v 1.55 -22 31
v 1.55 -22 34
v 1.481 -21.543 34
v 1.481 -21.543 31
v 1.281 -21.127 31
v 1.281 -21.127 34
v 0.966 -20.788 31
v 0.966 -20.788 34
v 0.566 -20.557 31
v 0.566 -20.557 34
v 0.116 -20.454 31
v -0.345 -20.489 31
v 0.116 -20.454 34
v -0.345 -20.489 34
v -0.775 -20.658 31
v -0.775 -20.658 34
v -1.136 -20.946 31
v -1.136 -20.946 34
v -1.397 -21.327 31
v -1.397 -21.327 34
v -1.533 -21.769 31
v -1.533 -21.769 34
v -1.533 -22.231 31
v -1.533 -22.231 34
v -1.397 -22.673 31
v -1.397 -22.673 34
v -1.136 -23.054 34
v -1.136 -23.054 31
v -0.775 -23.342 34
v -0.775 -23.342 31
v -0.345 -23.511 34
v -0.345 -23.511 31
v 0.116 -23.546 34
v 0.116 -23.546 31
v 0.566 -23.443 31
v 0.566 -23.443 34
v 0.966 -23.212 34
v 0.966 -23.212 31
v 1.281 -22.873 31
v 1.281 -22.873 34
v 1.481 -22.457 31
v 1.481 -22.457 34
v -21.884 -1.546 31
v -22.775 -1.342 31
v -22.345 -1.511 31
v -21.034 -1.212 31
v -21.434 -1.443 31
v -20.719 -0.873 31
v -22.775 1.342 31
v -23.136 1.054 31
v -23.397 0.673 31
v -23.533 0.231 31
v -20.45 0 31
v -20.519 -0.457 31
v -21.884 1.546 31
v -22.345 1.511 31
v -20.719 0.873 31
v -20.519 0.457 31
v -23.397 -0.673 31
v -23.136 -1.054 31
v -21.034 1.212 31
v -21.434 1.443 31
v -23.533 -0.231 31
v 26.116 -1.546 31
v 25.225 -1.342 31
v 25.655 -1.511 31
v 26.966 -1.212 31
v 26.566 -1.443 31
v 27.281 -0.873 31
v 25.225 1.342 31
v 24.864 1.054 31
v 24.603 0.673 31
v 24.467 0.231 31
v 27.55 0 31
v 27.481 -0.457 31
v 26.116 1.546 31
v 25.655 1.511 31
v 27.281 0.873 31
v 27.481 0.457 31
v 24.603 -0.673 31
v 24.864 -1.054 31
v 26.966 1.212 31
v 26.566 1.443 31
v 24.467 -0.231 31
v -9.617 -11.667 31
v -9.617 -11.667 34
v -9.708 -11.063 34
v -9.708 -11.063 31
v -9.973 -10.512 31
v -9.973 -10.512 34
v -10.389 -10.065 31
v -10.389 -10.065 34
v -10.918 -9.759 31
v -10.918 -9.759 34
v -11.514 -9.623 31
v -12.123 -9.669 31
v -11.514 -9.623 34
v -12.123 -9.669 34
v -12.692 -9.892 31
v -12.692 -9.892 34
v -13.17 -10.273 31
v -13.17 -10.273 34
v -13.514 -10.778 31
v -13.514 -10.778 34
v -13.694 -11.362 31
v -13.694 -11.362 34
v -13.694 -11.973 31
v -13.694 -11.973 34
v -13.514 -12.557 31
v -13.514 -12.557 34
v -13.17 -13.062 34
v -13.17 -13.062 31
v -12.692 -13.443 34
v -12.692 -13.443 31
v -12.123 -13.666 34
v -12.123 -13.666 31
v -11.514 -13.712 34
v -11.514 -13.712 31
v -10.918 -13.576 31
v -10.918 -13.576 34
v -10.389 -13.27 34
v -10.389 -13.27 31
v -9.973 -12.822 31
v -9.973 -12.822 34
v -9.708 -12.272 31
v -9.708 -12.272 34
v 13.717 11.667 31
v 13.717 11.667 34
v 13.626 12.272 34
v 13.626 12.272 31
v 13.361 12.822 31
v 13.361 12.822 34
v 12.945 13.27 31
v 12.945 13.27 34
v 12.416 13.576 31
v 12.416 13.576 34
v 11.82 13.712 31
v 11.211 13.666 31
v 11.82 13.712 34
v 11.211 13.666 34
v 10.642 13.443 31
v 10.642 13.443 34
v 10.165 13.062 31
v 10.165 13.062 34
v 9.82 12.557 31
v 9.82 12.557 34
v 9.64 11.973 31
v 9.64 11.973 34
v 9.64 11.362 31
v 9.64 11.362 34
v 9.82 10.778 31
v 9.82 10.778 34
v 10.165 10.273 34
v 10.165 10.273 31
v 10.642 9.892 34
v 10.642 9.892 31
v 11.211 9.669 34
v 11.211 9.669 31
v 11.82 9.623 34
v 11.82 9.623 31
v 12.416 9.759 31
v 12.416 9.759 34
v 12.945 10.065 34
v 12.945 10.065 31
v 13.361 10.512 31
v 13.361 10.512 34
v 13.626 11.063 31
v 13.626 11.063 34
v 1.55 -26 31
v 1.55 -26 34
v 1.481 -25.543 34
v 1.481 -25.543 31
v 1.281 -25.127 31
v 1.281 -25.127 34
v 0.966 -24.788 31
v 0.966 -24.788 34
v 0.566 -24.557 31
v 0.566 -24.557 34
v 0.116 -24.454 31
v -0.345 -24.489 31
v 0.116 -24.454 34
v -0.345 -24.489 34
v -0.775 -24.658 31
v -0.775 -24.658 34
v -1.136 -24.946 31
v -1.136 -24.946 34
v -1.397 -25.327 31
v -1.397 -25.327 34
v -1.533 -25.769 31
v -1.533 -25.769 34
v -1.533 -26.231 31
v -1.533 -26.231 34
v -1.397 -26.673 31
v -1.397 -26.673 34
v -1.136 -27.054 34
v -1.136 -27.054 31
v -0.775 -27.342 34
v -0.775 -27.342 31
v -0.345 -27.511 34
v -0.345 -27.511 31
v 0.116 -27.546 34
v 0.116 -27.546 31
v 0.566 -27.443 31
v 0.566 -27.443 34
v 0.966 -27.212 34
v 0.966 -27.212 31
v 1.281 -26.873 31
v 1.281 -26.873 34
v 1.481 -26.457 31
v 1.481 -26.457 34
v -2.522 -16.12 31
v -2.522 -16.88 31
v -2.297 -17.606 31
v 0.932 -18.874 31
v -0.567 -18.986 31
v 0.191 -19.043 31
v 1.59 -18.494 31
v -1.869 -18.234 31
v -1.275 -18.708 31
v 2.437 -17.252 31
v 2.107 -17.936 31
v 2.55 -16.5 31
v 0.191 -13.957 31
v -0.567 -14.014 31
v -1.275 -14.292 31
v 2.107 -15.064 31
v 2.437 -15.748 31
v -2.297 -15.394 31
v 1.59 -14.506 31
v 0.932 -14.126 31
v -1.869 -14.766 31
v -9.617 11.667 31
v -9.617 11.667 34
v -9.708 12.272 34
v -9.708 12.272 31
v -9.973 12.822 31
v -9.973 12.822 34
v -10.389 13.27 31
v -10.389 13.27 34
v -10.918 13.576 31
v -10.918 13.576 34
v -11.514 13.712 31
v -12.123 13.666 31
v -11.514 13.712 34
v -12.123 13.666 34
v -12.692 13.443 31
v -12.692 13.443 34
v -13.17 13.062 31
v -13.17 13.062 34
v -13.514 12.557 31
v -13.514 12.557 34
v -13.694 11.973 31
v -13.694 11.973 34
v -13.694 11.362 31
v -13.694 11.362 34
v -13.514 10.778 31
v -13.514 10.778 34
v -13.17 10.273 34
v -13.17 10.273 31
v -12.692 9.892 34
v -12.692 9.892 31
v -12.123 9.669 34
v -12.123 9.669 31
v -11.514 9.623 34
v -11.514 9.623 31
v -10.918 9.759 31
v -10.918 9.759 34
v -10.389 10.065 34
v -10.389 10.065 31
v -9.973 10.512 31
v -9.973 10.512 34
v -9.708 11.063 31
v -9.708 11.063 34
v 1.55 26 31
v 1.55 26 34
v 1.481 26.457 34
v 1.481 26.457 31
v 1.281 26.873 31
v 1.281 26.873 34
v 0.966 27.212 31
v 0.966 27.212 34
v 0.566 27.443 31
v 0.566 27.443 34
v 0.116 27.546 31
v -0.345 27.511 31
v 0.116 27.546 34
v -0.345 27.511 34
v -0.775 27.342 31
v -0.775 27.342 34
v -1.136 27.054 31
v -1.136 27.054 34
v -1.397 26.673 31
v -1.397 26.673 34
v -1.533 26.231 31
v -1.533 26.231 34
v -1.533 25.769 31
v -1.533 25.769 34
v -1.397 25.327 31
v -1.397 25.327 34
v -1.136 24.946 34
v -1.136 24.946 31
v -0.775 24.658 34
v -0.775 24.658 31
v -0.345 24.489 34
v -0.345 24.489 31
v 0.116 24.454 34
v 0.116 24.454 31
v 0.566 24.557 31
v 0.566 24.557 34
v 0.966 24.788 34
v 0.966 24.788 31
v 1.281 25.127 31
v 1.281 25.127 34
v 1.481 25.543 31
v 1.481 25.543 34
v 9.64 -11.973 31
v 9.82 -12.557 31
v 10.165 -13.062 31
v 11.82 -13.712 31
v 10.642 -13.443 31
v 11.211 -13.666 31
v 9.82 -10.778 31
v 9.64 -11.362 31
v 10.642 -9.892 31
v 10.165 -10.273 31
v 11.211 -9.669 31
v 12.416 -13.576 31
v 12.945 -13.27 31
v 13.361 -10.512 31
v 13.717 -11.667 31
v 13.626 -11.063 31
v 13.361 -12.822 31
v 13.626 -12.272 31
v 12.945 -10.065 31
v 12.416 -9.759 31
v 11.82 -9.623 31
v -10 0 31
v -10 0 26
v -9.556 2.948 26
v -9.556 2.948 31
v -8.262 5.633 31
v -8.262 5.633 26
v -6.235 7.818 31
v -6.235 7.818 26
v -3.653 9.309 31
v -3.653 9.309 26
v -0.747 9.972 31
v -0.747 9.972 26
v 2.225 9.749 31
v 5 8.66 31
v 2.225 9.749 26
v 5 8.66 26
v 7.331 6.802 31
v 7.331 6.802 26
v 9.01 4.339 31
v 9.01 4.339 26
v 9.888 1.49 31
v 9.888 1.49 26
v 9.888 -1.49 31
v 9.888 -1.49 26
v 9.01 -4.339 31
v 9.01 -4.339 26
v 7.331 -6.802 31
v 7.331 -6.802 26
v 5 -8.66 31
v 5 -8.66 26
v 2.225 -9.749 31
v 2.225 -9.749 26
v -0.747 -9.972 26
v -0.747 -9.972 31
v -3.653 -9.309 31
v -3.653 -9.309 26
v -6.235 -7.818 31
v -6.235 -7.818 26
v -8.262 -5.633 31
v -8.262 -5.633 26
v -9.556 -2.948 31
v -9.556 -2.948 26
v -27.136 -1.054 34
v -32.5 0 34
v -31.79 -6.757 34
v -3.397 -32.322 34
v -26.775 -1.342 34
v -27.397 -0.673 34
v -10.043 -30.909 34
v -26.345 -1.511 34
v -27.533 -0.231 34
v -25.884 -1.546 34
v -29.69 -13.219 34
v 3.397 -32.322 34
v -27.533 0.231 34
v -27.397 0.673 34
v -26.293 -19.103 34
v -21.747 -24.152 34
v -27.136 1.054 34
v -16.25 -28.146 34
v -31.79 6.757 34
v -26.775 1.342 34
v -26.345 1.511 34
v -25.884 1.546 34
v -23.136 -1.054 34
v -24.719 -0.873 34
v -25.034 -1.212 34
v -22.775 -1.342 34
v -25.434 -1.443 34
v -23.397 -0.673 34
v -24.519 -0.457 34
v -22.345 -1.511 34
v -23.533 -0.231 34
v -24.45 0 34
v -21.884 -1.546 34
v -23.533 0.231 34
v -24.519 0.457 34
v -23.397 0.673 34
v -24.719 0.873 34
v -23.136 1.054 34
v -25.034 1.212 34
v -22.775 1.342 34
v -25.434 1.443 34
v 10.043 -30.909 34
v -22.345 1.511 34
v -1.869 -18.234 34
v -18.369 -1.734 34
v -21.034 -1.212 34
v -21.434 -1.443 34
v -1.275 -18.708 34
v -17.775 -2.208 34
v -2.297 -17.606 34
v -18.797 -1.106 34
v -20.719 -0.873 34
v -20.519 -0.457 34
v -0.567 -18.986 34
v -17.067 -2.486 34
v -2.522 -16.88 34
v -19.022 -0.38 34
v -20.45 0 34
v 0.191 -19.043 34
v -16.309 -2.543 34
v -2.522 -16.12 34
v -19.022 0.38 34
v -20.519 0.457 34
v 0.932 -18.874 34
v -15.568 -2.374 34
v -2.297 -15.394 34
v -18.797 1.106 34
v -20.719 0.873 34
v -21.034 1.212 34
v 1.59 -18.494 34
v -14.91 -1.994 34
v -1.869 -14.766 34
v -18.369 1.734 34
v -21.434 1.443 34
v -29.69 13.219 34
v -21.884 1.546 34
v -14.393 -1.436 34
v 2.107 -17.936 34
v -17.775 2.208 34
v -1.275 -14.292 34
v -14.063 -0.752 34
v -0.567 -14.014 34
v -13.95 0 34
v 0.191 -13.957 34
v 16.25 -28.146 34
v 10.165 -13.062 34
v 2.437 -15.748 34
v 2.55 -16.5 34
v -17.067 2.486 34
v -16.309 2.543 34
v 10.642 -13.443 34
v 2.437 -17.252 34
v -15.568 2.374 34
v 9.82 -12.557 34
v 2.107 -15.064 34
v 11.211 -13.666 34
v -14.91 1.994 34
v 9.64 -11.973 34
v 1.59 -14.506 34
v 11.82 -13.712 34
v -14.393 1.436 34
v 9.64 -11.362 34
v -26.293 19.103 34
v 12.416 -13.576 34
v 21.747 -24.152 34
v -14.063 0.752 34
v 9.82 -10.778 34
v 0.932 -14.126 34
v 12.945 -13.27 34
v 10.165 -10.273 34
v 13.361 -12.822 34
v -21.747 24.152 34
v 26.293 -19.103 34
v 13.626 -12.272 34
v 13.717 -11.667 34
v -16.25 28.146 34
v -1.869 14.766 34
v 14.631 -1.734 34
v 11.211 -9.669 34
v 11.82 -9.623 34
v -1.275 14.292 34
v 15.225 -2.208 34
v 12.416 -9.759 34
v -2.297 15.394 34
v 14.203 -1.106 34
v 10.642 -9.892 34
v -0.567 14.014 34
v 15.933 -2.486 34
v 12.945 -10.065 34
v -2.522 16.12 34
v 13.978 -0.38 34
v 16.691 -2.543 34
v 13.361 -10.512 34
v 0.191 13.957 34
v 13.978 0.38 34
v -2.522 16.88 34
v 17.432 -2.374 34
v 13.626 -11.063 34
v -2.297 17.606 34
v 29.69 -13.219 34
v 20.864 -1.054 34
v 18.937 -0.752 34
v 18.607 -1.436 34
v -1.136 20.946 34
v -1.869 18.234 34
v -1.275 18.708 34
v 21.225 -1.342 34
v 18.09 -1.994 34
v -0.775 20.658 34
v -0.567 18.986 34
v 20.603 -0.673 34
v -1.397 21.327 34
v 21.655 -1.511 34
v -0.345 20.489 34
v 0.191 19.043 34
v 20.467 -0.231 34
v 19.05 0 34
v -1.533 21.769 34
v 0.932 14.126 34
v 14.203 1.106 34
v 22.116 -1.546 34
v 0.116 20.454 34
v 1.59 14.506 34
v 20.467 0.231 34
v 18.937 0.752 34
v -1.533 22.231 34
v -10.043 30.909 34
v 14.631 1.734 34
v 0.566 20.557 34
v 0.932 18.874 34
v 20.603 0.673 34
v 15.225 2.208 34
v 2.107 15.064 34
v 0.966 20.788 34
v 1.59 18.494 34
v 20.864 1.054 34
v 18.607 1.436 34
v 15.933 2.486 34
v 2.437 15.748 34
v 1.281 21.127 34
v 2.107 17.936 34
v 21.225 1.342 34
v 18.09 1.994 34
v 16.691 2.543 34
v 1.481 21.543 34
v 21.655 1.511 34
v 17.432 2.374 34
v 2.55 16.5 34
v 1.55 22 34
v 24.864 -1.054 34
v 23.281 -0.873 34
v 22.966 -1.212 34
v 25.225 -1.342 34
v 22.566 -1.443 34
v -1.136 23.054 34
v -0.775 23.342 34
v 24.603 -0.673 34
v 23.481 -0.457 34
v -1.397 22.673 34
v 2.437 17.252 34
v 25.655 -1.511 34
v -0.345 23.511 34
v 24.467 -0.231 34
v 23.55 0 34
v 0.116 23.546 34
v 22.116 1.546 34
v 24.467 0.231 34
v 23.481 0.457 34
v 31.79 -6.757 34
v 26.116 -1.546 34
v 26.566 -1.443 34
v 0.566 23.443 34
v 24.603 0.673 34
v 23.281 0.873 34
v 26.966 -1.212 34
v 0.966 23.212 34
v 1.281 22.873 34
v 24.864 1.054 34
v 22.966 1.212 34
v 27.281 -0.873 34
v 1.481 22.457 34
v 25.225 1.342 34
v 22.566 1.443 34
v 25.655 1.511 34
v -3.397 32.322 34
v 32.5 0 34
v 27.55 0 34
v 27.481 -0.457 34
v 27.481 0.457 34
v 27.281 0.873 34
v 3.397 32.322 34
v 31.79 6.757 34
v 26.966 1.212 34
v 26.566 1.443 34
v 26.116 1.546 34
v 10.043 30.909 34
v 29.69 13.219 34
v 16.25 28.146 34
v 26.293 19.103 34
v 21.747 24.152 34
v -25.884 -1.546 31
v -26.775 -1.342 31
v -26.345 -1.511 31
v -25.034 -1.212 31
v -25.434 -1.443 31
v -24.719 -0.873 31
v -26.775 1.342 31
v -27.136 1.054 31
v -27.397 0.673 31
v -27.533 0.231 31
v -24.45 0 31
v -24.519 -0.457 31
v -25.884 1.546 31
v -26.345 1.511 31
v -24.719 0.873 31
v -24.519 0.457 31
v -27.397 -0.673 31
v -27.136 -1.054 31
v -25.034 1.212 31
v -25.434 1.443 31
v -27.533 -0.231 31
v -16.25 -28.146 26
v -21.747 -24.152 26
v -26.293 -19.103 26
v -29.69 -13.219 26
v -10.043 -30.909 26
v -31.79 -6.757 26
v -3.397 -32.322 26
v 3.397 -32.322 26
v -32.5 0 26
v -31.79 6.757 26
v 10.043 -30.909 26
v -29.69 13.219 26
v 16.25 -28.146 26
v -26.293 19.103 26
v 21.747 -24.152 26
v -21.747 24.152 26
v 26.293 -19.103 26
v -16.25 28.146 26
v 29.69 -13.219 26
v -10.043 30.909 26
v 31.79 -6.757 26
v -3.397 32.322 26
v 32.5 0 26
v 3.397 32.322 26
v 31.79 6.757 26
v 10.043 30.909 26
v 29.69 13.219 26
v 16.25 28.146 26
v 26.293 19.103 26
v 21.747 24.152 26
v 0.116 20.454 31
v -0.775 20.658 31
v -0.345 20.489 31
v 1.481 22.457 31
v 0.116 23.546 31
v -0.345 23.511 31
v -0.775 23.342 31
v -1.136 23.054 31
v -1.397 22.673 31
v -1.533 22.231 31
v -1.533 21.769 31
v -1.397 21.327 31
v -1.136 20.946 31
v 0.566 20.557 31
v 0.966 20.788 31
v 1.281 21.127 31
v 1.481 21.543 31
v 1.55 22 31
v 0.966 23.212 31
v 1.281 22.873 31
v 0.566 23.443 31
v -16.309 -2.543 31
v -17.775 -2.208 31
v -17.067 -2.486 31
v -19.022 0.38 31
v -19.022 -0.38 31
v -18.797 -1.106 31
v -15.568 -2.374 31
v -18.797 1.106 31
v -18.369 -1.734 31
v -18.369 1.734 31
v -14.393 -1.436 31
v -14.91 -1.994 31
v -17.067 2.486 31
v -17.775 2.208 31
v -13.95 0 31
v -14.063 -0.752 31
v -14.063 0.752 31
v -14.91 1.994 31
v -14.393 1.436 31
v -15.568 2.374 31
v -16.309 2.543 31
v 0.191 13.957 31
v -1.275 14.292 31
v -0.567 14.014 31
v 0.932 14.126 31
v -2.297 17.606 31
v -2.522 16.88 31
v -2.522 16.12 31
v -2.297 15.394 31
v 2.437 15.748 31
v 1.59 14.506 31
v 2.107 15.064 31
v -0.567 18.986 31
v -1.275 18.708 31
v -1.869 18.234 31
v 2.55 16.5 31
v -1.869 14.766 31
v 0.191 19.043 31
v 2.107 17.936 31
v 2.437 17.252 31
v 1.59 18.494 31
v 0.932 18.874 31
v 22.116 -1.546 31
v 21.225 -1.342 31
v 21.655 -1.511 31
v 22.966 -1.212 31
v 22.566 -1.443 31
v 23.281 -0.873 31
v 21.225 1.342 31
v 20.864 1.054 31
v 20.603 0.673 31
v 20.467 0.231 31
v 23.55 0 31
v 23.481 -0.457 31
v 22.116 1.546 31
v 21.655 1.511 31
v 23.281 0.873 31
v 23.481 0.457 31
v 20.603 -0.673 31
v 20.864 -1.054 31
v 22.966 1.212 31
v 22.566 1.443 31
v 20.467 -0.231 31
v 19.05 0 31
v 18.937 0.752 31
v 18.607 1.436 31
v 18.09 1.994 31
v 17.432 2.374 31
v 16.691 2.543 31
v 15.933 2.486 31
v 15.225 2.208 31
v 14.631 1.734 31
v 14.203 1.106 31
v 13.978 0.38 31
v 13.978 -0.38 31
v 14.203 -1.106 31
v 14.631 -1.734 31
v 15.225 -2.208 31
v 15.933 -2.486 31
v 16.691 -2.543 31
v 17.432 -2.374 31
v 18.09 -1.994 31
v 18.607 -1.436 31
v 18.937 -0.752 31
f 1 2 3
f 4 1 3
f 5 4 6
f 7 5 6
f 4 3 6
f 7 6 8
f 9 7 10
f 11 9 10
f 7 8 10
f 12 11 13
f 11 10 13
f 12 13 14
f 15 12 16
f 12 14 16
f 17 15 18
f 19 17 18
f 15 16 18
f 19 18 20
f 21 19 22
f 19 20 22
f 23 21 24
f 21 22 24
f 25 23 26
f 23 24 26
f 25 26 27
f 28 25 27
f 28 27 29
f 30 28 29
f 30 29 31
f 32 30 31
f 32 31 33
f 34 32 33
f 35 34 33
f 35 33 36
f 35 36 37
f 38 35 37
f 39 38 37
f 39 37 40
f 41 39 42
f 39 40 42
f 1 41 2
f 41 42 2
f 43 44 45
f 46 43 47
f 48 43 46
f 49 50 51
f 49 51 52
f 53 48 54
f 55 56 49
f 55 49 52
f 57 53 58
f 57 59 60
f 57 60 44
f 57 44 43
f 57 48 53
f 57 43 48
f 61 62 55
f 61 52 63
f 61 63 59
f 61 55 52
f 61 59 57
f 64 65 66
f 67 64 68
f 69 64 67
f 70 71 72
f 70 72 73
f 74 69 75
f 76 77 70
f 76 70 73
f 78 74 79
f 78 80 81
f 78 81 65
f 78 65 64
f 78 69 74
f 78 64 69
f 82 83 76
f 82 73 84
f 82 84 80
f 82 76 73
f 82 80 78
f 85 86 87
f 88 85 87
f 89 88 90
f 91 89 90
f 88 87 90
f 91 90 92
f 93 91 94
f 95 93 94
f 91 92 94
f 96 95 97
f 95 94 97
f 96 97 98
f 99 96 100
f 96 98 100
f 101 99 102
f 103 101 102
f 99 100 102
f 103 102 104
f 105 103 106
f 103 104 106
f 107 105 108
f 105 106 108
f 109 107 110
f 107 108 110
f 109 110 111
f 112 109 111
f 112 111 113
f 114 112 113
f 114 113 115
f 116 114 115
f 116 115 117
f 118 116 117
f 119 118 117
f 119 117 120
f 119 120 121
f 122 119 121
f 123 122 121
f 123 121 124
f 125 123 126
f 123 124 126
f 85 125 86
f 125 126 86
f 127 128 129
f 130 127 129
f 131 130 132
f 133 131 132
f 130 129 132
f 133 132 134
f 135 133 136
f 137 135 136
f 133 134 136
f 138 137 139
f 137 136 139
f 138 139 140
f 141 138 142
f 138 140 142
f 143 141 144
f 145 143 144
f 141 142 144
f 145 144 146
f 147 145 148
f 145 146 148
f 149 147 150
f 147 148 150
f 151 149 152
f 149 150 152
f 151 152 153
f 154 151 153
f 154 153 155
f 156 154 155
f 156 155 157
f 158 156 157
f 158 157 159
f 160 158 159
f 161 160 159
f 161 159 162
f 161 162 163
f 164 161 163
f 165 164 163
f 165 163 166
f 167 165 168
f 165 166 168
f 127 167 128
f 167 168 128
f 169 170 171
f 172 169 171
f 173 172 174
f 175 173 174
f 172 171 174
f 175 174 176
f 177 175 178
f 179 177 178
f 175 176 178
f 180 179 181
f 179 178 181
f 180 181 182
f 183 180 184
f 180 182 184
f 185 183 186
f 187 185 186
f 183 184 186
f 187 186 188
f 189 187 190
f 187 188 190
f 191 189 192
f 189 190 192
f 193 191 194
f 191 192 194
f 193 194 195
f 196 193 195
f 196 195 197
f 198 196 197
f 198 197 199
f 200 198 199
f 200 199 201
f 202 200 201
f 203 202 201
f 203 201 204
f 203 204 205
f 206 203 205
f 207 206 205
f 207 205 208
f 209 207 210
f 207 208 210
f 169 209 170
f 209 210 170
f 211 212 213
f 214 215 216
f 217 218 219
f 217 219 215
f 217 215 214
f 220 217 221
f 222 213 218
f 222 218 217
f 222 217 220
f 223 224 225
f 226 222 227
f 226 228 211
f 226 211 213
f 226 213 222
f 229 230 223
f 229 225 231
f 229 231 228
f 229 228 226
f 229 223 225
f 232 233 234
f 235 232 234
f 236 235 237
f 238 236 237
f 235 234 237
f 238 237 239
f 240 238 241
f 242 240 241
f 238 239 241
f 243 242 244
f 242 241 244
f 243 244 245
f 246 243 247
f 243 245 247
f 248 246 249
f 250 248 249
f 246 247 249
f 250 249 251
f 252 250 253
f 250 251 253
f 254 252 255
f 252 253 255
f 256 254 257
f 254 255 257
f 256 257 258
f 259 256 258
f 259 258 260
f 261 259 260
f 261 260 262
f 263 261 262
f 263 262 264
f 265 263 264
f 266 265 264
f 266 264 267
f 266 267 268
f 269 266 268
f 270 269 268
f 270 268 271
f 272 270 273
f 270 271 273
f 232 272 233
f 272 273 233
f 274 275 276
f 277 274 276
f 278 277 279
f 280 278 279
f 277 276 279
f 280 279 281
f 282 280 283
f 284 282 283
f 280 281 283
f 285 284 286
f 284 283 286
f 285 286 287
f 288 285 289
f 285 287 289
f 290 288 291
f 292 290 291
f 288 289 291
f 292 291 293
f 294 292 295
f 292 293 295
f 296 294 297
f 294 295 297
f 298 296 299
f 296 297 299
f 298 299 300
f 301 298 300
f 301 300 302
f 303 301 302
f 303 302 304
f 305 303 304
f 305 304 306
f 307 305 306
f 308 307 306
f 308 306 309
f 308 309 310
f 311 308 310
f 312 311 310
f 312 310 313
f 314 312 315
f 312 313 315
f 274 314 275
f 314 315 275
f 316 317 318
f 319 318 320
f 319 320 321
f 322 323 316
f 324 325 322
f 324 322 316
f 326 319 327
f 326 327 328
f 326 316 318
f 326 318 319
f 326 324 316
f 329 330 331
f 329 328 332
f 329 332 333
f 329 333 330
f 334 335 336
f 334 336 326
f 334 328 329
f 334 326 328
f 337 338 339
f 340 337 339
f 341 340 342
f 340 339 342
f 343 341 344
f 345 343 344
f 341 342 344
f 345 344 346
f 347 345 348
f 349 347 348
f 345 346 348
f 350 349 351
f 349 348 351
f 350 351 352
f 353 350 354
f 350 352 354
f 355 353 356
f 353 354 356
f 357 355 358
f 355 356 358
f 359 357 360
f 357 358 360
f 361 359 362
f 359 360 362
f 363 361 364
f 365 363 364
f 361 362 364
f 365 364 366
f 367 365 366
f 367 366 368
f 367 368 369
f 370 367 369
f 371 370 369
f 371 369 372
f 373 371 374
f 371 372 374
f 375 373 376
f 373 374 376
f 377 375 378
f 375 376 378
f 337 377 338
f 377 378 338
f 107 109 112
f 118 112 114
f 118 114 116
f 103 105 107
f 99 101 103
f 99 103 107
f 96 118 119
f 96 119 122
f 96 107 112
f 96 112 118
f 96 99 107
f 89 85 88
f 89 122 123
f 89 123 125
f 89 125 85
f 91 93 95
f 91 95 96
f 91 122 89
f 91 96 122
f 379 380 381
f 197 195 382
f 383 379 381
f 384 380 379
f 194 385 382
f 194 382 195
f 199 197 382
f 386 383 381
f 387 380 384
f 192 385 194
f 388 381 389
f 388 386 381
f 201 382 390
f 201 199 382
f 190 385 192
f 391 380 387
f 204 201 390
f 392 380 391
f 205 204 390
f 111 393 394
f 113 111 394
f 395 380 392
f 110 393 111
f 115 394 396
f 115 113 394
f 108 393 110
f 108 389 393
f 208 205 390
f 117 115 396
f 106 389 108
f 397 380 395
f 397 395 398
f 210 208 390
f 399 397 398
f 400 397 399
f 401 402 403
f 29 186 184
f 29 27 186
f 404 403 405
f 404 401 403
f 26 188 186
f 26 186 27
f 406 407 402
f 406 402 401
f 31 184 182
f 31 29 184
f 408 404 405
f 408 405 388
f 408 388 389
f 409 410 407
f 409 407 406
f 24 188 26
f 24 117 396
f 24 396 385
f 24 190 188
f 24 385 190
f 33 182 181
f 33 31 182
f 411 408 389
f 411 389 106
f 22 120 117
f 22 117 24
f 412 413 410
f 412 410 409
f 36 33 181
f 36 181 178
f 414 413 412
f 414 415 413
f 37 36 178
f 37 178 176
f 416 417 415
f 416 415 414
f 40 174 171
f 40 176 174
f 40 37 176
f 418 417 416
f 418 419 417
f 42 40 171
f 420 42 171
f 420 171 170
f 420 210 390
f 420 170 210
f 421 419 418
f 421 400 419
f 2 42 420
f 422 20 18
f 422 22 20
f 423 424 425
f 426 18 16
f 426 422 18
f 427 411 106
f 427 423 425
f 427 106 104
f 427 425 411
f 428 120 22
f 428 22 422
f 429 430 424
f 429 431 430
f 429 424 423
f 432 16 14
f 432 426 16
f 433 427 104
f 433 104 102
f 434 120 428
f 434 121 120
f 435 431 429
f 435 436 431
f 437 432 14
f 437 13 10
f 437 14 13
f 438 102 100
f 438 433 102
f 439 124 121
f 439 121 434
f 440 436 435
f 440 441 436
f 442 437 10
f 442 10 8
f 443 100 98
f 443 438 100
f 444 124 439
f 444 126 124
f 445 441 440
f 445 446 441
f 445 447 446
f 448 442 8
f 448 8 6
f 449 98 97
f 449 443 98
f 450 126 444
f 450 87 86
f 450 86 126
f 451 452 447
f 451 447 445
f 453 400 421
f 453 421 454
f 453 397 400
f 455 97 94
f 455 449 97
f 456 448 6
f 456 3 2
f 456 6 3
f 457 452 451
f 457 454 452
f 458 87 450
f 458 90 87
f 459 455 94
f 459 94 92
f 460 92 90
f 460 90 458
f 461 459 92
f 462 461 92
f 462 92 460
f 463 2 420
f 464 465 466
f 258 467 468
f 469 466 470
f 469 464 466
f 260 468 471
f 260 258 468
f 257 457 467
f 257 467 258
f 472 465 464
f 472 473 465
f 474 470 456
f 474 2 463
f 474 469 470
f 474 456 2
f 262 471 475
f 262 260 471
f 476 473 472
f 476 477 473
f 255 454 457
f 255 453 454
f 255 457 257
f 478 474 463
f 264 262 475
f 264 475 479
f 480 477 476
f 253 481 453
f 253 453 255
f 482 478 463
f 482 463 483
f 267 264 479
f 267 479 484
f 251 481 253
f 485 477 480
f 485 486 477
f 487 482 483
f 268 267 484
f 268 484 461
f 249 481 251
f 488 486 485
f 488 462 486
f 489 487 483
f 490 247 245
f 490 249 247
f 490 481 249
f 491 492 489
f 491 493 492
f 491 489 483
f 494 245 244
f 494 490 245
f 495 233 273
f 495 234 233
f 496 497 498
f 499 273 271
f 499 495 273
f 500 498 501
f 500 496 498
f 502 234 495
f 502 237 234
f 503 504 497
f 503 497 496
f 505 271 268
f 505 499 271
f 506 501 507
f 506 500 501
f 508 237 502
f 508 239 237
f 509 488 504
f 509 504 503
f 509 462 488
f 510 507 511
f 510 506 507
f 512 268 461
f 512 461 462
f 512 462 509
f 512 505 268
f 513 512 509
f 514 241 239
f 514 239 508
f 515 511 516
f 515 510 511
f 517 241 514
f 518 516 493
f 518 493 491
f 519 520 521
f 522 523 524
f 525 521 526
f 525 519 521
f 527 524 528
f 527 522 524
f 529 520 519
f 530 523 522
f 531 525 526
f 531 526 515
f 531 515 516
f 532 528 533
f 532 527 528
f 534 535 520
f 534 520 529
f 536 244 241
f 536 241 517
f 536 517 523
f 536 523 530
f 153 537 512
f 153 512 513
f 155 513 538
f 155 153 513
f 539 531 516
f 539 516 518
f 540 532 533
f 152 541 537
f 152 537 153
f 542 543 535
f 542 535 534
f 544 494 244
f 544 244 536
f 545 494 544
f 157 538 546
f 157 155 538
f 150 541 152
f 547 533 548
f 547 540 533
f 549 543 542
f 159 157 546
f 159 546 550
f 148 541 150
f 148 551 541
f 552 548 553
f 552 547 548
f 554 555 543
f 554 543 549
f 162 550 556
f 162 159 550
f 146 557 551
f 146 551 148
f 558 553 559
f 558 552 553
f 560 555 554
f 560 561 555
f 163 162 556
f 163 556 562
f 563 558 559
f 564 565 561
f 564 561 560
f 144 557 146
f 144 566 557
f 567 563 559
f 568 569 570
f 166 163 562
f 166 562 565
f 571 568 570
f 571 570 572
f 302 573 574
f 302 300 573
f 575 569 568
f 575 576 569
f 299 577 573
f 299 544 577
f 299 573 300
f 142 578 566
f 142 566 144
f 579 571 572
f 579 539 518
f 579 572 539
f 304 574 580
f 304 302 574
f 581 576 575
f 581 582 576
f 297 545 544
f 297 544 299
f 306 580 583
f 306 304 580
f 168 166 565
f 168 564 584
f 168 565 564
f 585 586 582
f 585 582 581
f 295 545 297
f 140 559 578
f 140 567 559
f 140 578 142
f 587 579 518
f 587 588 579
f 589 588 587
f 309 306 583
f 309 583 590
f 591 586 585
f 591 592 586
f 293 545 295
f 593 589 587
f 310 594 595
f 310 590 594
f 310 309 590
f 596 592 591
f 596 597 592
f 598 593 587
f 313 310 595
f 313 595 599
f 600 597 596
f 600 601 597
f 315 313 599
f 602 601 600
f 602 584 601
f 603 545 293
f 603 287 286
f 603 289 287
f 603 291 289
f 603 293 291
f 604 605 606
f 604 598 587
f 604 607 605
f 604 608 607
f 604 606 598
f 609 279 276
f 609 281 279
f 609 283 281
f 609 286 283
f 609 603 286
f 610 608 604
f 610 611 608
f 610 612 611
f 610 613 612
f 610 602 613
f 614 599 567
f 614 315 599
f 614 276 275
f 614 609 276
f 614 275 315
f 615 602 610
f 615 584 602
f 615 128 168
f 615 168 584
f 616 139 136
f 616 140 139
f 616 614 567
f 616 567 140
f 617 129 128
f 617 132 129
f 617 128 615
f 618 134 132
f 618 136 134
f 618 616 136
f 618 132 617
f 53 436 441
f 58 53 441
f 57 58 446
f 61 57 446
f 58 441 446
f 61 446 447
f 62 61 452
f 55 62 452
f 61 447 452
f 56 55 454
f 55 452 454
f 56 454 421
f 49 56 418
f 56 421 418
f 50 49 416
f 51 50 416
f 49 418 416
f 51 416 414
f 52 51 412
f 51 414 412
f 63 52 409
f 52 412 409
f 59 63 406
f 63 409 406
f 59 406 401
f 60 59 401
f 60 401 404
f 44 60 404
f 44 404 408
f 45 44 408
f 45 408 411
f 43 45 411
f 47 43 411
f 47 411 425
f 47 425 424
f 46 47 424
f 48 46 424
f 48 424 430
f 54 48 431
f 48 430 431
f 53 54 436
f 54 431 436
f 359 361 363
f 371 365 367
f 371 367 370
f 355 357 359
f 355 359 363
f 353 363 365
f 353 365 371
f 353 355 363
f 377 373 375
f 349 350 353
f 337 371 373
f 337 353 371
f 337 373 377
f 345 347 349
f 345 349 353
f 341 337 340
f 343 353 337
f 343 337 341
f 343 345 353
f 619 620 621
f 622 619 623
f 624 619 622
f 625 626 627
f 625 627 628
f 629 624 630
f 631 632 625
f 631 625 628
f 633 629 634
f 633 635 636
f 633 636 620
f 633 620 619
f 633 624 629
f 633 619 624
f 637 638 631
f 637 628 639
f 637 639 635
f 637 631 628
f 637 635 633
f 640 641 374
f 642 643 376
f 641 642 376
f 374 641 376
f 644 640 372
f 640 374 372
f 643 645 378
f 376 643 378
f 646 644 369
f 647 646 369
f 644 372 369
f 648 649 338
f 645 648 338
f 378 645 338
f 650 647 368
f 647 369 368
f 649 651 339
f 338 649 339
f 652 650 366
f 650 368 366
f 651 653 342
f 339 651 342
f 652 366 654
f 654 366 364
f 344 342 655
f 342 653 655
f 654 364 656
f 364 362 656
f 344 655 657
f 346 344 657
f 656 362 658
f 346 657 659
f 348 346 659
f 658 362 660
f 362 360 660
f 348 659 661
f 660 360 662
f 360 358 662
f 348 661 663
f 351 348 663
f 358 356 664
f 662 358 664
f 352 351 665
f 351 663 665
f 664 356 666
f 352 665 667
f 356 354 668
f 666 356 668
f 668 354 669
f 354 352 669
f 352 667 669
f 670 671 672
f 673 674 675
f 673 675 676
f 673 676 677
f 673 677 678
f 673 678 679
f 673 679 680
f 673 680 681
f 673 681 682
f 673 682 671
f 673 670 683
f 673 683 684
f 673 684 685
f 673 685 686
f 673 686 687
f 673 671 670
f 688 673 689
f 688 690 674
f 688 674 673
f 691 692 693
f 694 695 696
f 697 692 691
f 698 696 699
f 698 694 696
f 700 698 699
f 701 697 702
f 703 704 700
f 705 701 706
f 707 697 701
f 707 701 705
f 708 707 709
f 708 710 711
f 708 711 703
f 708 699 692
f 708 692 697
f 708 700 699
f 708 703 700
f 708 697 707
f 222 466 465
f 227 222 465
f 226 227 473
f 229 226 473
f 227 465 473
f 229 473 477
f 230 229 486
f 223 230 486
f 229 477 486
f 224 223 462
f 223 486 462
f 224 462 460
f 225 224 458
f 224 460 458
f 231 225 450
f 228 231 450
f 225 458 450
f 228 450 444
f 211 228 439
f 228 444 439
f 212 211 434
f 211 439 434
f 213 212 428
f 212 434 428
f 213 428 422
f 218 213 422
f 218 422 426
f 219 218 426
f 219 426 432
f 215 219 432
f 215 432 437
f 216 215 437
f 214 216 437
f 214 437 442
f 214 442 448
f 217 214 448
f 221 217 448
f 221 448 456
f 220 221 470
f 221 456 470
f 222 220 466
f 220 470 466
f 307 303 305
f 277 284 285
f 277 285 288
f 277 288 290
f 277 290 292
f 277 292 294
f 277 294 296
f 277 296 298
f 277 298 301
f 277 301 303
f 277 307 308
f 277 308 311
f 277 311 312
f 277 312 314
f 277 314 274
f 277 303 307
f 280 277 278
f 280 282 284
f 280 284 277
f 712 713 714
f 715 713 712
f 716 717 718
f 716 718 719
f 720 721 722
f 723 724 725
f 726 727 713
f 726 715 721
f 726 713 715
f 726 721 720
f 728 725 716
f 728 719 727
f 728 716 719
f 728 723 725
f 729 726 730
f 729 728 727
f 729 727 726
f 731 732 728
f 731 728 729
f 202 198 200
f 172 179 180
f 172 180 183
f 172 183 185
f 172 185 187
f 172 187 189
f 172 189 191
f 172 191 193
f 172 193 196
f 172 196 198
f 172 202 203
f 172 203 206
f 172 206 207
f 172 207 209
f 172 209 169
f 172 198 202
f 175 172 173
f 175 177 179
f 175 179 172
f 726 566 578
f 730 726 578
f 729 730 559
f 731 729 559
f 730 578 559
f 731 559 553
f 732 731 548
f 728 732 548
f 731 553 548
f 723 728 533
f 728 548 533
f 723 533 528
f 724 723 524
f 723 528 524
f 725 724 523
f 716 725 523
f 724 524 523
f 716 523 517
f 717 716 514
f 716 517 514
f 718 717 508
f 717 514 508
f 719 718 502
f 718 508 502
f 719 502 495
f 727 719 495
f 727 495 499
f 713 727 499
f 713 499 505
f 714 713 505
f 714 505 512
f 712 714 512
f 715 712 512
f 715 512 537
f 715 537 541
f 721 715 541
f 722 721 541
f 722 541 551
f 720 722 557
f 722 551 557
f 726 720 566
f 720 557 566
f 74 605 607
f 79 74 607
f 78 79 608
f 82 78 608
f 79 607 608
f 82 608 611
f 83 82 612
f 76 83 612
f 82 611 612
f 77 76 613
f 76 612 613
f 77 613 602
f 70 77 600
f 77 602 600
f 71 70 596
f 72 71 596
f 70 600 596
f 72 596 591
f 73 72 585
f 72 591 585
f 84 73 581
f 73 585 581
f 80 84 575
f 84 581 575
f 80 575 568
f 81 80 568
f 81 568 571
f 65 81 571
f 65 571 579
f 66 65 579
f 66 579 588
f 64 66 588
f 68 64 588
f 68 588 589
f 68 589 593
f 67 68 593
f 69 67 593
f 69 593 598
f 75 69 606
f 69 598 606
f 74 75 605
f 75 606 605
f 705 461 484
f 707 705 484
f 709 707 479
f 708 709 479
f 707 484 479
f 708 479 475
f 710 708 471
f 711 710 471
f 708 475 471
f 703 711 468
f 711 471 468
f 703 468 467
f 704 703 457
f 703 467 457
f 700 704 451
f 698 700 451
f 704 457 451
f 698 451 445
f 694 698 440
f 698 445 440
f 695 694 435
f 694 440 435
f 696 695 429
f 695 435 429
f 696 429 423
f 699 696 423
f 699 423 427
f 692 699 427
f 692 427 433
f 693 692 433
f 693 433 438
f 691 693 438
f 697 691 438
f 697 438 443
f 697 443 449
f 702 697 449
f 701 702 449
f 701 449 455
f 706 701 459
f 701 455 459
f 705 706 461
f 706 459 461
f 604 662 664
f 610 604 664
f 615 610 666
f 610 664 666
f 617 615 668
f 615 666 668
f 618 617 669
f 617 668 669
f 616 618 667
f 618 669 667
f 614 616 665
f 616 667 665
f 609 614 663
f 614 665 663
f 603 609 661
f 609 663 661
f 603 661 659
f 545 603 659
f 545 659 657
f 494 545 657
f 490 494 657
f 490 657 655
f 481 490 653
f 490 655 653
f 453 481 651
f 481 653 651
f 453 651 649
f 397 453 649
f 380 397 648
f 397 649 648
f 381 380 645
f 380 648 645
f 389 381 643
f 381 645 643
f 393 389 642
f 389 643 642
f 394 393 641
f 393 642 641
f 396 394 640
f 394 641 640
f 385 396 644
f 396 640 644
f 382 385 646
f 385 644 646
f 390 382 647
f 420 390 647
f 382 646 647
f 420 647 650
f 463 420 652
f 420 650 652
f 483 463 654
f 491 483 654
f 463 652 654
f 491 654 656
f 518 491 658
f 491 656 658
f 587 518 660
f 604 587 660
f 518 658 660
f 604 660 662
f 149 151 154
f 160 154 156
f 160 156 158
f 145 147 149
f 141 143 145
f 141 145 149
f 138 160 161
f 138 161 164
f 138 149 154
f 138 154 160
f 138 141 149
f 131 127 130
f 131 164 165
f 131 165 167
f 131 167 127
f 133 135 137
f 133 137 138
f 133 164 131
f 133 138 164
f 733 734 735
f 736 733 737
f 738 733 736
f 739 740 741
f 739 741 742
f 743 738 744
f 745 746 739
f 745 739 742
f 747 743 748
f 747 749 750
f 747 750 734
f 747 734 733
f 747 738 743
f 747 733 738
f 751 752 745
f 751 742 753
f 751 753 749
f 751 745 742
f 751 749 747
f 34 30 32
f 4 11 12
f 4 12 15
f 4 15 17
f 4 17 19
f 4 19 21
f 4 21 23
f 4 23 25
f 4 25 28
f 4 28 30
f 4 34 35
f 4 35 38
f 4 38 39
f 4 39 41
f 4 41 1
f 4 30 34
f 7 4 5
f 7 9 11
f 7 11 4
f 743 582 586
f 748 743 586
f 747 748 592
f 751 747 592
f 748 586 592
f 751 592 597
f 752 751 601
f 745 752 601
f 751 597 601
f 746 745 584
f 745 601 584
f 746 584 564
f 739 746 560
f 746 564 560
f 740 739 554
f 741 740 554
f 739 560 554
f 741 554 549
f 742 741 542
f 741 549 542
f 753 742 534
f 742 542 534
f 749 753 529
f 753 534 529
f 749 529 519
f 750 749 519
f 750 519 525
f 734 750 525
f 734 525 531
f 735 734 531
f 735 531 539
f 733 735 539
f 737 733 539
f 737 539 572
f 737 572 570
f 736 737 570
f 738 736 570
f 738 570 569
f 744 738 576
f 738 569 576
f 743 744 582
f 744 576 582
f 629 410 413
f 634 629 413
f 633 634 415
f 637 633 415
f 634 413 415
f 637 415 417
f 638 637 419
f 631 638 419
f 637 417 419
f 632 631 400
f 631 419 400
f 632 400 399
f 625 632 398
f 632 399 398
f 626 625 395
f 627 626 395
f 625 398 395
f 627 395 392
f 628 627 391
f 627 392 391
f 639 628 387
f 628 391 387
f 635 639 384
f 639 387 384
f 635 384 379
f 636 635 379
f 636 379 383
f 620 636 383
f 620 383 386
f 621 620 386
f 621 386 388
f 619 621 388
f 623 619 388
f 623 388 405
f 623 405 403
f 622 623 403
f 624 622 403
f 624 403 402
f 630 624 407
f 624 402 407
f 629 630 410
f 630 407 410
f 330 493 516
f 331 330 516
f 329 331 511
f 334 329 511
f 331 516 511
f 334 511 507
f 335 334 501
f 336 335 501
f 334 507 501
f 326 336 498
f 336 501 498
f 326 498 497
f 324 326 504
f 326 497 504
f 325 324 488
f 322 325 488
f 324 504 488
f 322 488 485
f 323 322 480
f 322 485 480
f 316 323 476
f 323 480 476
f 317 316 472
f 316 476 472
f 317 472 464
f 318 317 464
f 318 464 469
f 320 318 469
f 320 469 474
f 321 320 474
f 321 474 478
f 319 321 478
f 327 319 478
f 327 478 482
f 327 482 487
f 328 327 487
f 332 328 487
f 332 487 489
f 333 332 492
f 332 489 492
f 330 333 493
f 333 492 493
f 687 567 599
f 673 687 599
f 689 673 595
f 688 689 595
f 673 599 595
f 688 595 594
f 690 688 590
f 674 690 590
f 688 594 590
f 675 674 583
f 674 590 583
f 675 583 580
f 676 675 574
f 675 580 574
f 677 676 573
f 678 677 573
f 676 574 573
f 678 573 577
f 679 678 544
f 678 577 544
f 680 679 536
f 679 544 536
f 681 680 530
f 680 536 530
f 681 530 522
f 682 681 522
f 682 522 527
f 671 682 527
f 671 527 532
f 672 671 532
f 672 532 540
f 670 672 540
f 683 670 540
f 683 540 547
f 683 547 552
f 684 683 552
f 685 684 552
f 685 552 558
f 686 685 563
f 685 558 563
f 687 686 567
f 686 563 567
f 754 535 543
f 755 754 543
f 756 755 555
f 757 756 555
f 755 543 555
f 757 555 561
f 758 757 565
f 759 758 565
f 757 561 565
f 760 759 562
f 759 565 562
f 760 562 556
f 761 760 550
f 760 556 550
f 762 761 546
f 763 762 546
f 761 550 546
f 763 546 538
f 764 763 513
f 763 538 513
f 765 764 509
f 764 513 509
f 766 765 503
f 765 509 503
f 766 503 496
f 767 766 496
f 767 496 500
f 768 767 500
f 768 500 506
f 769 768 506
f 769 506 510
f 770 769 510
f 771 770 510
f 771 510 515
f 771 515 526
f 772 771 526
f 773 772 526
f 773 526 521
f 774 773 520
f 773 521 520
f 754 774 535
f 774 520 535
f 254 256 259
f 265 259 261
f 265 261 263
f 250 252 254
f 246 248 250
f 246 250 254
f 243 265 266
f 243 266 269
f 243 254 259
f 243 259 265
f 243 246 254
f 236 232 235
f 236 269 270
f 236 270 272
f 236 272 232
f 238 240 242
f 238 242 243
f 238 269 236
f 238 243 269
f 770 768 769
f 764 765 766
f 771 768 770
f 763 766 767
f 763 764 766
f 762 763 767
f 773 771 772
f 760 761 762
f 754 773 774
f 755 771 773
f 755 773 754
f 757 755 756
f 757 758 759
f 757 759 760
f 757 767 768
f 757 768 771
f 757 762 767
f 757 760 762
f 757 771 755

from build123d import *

# Parameters (mm, degrees)
SKETCH1_R           = 55
BOSS_EXTRUDE1_DEPTH = 26
SKETCH2_R           = 1.5
CUT_EXTRUDE1_DEPTH  = 3
SKETCH3_R           = 32.5
BOSS_EXTRUDE2_DEPTH = 8
SKETCH4_R           = 2.55
SKETCH4_R_2         = 1.55
SKETCH4_R_3         = 2.05
CUT_EXTRUDE2_DEPTH  = 3
FILLET1_R           = 2
SKETCH9_R           = 75
CUT_EXTRUDE5_DEPTH  = 83.012194282
SKETCH11_R          = 10
CUT_EXTRUDE6_DEPTH  = 5


with BuildPart() as part:
    # Sketch1 → Boss-Extrude1 (new body)
    with BuildSketch(Plane.XY):
        with Locations(Location((0, 0, 0), (0, 0, 180))):
            Circle(SKETCH1_R)
    extrude(amount=BOSS_EXTRUDE1_DEPTH)

    # Sketch2 → Cut-Extrude1 (cut)
    with BuildSketch(Plane(origin=(0, 0, 0), x_dir=(-1, 0, 0), z_dir=(0, 0, -1))):
        with Locations((0, -21)):
            Circle(SKETCH2_R)
        with Locations((-14.849242405, -14.849242405)):
            Circle(SKETCH2_R)
        with Locations((-21, 0)):
            Circle(SKETCH2_R)
        with Locations((-14.849242405, 14.849242405)):
            Circle(SKETCH2_R)
        with Locations((0, 21)):
            Circle(SKETCH2_R)
        with Locations((14.849242405, 14.849242405)):
            Circle(SKETCH2_R)
        with Locations((21, 0)):
            Circle(SKETCH2_R)
        with Locations((14.849242405, -14.849242405)):
            Circle(SKETCH2_R)
    extrude(amount=-CUT_EXTRUDE1_DEPTH, mode=Mode.SUBTRACT)

    # Sketch3 → Boss-Extrude2 (add)
    with BuildSketch(Plane.XY.offset(26)):
        Circle(SKETCH3_R)
    extrude(amount=BOSS_EXTRUDE2_DEPTH)

    # Sketch4 → Cut-Extrude2 (cut)
    with BuildSketch(Plane.XY.offset(34)):
        with Locations((-16.5, 0)):
            Circle(SKETCH4_R)
        with Locations((0, -16.5)):
            Circle(SKETCH4_R)
        with Locations((16.5, 0)):
            Circle(SKETCH4_R)
        with Locations((0, 16.5)):
            Circle(SKETCH4_R)
        with Locations((0, 26)):
            Circle(SKETCH4_R_2)
        with Locations((0, 22)):
            Circle(SKETCH4_R_2)
        with Locations((-11.66726189, -11.66726189)):
            Circle(SKETCH4_R_3)
        with Locations((11.66726189, -11.66726189)):
            Circle(SKETCH4_R_3)
        with Locations((11.66726189, 11.66726189)):
            Circle(SKETCH4_R_3)
        with Locations((-11.66726189, 11.66726189)):
            Circle(SKETCH4_R_3)
        with Locations((-22, 0)):
            Circle(SKETCH4_R_2)
        with Locations((-26, 0)):
            Circle(SKETCH4_R_2)
        with Locations((0, -22)):
            Circle(SKETCH4_R_2)
        with Locations((0, -26)):
            Circle(SKETCH4_R_2)
        with Locations((22, 0)):
            Circle(SKETCH4_R_2)
        with Locations((26, 0)):
            Circle(SKETCH4_R_2)
    extrude(amount=-CUT_EXTRUDE2_DEPTH, mode=Mode.SUBTRACT)

    # Fillet1
    fillet1_edges = [part.edges().sort_by_distance(p)[0] for p in [
        (55, 0, 0),
        (55, 0, 26),
    ]]
    fillet(fillet1_edges, radius=FILLET1_R)

    # Sketch9 → Cut-Extrude5 (cut, through all)
    with BuildSketch(Plane.XY.offset(26)):
        Circle(SKETCH9_R)
    extrude(amount=-CUT_EXTRUDE5_DEPTH, mode=Mode.SUBTRACT)

    # Sketch11 → Cut-Extrude6 (cut)
    with BuildSketch(Plane(origin=(0, 0, 26), x_dir=(-1, 0, 0), z_dir=(0, 0, -1))):
        Circle(SKETCH11_R)
    extrude(amount=-CUT_EXTRUDE6_DEPTH, mode=Mode.SUBTRACT)


solid = part.part
